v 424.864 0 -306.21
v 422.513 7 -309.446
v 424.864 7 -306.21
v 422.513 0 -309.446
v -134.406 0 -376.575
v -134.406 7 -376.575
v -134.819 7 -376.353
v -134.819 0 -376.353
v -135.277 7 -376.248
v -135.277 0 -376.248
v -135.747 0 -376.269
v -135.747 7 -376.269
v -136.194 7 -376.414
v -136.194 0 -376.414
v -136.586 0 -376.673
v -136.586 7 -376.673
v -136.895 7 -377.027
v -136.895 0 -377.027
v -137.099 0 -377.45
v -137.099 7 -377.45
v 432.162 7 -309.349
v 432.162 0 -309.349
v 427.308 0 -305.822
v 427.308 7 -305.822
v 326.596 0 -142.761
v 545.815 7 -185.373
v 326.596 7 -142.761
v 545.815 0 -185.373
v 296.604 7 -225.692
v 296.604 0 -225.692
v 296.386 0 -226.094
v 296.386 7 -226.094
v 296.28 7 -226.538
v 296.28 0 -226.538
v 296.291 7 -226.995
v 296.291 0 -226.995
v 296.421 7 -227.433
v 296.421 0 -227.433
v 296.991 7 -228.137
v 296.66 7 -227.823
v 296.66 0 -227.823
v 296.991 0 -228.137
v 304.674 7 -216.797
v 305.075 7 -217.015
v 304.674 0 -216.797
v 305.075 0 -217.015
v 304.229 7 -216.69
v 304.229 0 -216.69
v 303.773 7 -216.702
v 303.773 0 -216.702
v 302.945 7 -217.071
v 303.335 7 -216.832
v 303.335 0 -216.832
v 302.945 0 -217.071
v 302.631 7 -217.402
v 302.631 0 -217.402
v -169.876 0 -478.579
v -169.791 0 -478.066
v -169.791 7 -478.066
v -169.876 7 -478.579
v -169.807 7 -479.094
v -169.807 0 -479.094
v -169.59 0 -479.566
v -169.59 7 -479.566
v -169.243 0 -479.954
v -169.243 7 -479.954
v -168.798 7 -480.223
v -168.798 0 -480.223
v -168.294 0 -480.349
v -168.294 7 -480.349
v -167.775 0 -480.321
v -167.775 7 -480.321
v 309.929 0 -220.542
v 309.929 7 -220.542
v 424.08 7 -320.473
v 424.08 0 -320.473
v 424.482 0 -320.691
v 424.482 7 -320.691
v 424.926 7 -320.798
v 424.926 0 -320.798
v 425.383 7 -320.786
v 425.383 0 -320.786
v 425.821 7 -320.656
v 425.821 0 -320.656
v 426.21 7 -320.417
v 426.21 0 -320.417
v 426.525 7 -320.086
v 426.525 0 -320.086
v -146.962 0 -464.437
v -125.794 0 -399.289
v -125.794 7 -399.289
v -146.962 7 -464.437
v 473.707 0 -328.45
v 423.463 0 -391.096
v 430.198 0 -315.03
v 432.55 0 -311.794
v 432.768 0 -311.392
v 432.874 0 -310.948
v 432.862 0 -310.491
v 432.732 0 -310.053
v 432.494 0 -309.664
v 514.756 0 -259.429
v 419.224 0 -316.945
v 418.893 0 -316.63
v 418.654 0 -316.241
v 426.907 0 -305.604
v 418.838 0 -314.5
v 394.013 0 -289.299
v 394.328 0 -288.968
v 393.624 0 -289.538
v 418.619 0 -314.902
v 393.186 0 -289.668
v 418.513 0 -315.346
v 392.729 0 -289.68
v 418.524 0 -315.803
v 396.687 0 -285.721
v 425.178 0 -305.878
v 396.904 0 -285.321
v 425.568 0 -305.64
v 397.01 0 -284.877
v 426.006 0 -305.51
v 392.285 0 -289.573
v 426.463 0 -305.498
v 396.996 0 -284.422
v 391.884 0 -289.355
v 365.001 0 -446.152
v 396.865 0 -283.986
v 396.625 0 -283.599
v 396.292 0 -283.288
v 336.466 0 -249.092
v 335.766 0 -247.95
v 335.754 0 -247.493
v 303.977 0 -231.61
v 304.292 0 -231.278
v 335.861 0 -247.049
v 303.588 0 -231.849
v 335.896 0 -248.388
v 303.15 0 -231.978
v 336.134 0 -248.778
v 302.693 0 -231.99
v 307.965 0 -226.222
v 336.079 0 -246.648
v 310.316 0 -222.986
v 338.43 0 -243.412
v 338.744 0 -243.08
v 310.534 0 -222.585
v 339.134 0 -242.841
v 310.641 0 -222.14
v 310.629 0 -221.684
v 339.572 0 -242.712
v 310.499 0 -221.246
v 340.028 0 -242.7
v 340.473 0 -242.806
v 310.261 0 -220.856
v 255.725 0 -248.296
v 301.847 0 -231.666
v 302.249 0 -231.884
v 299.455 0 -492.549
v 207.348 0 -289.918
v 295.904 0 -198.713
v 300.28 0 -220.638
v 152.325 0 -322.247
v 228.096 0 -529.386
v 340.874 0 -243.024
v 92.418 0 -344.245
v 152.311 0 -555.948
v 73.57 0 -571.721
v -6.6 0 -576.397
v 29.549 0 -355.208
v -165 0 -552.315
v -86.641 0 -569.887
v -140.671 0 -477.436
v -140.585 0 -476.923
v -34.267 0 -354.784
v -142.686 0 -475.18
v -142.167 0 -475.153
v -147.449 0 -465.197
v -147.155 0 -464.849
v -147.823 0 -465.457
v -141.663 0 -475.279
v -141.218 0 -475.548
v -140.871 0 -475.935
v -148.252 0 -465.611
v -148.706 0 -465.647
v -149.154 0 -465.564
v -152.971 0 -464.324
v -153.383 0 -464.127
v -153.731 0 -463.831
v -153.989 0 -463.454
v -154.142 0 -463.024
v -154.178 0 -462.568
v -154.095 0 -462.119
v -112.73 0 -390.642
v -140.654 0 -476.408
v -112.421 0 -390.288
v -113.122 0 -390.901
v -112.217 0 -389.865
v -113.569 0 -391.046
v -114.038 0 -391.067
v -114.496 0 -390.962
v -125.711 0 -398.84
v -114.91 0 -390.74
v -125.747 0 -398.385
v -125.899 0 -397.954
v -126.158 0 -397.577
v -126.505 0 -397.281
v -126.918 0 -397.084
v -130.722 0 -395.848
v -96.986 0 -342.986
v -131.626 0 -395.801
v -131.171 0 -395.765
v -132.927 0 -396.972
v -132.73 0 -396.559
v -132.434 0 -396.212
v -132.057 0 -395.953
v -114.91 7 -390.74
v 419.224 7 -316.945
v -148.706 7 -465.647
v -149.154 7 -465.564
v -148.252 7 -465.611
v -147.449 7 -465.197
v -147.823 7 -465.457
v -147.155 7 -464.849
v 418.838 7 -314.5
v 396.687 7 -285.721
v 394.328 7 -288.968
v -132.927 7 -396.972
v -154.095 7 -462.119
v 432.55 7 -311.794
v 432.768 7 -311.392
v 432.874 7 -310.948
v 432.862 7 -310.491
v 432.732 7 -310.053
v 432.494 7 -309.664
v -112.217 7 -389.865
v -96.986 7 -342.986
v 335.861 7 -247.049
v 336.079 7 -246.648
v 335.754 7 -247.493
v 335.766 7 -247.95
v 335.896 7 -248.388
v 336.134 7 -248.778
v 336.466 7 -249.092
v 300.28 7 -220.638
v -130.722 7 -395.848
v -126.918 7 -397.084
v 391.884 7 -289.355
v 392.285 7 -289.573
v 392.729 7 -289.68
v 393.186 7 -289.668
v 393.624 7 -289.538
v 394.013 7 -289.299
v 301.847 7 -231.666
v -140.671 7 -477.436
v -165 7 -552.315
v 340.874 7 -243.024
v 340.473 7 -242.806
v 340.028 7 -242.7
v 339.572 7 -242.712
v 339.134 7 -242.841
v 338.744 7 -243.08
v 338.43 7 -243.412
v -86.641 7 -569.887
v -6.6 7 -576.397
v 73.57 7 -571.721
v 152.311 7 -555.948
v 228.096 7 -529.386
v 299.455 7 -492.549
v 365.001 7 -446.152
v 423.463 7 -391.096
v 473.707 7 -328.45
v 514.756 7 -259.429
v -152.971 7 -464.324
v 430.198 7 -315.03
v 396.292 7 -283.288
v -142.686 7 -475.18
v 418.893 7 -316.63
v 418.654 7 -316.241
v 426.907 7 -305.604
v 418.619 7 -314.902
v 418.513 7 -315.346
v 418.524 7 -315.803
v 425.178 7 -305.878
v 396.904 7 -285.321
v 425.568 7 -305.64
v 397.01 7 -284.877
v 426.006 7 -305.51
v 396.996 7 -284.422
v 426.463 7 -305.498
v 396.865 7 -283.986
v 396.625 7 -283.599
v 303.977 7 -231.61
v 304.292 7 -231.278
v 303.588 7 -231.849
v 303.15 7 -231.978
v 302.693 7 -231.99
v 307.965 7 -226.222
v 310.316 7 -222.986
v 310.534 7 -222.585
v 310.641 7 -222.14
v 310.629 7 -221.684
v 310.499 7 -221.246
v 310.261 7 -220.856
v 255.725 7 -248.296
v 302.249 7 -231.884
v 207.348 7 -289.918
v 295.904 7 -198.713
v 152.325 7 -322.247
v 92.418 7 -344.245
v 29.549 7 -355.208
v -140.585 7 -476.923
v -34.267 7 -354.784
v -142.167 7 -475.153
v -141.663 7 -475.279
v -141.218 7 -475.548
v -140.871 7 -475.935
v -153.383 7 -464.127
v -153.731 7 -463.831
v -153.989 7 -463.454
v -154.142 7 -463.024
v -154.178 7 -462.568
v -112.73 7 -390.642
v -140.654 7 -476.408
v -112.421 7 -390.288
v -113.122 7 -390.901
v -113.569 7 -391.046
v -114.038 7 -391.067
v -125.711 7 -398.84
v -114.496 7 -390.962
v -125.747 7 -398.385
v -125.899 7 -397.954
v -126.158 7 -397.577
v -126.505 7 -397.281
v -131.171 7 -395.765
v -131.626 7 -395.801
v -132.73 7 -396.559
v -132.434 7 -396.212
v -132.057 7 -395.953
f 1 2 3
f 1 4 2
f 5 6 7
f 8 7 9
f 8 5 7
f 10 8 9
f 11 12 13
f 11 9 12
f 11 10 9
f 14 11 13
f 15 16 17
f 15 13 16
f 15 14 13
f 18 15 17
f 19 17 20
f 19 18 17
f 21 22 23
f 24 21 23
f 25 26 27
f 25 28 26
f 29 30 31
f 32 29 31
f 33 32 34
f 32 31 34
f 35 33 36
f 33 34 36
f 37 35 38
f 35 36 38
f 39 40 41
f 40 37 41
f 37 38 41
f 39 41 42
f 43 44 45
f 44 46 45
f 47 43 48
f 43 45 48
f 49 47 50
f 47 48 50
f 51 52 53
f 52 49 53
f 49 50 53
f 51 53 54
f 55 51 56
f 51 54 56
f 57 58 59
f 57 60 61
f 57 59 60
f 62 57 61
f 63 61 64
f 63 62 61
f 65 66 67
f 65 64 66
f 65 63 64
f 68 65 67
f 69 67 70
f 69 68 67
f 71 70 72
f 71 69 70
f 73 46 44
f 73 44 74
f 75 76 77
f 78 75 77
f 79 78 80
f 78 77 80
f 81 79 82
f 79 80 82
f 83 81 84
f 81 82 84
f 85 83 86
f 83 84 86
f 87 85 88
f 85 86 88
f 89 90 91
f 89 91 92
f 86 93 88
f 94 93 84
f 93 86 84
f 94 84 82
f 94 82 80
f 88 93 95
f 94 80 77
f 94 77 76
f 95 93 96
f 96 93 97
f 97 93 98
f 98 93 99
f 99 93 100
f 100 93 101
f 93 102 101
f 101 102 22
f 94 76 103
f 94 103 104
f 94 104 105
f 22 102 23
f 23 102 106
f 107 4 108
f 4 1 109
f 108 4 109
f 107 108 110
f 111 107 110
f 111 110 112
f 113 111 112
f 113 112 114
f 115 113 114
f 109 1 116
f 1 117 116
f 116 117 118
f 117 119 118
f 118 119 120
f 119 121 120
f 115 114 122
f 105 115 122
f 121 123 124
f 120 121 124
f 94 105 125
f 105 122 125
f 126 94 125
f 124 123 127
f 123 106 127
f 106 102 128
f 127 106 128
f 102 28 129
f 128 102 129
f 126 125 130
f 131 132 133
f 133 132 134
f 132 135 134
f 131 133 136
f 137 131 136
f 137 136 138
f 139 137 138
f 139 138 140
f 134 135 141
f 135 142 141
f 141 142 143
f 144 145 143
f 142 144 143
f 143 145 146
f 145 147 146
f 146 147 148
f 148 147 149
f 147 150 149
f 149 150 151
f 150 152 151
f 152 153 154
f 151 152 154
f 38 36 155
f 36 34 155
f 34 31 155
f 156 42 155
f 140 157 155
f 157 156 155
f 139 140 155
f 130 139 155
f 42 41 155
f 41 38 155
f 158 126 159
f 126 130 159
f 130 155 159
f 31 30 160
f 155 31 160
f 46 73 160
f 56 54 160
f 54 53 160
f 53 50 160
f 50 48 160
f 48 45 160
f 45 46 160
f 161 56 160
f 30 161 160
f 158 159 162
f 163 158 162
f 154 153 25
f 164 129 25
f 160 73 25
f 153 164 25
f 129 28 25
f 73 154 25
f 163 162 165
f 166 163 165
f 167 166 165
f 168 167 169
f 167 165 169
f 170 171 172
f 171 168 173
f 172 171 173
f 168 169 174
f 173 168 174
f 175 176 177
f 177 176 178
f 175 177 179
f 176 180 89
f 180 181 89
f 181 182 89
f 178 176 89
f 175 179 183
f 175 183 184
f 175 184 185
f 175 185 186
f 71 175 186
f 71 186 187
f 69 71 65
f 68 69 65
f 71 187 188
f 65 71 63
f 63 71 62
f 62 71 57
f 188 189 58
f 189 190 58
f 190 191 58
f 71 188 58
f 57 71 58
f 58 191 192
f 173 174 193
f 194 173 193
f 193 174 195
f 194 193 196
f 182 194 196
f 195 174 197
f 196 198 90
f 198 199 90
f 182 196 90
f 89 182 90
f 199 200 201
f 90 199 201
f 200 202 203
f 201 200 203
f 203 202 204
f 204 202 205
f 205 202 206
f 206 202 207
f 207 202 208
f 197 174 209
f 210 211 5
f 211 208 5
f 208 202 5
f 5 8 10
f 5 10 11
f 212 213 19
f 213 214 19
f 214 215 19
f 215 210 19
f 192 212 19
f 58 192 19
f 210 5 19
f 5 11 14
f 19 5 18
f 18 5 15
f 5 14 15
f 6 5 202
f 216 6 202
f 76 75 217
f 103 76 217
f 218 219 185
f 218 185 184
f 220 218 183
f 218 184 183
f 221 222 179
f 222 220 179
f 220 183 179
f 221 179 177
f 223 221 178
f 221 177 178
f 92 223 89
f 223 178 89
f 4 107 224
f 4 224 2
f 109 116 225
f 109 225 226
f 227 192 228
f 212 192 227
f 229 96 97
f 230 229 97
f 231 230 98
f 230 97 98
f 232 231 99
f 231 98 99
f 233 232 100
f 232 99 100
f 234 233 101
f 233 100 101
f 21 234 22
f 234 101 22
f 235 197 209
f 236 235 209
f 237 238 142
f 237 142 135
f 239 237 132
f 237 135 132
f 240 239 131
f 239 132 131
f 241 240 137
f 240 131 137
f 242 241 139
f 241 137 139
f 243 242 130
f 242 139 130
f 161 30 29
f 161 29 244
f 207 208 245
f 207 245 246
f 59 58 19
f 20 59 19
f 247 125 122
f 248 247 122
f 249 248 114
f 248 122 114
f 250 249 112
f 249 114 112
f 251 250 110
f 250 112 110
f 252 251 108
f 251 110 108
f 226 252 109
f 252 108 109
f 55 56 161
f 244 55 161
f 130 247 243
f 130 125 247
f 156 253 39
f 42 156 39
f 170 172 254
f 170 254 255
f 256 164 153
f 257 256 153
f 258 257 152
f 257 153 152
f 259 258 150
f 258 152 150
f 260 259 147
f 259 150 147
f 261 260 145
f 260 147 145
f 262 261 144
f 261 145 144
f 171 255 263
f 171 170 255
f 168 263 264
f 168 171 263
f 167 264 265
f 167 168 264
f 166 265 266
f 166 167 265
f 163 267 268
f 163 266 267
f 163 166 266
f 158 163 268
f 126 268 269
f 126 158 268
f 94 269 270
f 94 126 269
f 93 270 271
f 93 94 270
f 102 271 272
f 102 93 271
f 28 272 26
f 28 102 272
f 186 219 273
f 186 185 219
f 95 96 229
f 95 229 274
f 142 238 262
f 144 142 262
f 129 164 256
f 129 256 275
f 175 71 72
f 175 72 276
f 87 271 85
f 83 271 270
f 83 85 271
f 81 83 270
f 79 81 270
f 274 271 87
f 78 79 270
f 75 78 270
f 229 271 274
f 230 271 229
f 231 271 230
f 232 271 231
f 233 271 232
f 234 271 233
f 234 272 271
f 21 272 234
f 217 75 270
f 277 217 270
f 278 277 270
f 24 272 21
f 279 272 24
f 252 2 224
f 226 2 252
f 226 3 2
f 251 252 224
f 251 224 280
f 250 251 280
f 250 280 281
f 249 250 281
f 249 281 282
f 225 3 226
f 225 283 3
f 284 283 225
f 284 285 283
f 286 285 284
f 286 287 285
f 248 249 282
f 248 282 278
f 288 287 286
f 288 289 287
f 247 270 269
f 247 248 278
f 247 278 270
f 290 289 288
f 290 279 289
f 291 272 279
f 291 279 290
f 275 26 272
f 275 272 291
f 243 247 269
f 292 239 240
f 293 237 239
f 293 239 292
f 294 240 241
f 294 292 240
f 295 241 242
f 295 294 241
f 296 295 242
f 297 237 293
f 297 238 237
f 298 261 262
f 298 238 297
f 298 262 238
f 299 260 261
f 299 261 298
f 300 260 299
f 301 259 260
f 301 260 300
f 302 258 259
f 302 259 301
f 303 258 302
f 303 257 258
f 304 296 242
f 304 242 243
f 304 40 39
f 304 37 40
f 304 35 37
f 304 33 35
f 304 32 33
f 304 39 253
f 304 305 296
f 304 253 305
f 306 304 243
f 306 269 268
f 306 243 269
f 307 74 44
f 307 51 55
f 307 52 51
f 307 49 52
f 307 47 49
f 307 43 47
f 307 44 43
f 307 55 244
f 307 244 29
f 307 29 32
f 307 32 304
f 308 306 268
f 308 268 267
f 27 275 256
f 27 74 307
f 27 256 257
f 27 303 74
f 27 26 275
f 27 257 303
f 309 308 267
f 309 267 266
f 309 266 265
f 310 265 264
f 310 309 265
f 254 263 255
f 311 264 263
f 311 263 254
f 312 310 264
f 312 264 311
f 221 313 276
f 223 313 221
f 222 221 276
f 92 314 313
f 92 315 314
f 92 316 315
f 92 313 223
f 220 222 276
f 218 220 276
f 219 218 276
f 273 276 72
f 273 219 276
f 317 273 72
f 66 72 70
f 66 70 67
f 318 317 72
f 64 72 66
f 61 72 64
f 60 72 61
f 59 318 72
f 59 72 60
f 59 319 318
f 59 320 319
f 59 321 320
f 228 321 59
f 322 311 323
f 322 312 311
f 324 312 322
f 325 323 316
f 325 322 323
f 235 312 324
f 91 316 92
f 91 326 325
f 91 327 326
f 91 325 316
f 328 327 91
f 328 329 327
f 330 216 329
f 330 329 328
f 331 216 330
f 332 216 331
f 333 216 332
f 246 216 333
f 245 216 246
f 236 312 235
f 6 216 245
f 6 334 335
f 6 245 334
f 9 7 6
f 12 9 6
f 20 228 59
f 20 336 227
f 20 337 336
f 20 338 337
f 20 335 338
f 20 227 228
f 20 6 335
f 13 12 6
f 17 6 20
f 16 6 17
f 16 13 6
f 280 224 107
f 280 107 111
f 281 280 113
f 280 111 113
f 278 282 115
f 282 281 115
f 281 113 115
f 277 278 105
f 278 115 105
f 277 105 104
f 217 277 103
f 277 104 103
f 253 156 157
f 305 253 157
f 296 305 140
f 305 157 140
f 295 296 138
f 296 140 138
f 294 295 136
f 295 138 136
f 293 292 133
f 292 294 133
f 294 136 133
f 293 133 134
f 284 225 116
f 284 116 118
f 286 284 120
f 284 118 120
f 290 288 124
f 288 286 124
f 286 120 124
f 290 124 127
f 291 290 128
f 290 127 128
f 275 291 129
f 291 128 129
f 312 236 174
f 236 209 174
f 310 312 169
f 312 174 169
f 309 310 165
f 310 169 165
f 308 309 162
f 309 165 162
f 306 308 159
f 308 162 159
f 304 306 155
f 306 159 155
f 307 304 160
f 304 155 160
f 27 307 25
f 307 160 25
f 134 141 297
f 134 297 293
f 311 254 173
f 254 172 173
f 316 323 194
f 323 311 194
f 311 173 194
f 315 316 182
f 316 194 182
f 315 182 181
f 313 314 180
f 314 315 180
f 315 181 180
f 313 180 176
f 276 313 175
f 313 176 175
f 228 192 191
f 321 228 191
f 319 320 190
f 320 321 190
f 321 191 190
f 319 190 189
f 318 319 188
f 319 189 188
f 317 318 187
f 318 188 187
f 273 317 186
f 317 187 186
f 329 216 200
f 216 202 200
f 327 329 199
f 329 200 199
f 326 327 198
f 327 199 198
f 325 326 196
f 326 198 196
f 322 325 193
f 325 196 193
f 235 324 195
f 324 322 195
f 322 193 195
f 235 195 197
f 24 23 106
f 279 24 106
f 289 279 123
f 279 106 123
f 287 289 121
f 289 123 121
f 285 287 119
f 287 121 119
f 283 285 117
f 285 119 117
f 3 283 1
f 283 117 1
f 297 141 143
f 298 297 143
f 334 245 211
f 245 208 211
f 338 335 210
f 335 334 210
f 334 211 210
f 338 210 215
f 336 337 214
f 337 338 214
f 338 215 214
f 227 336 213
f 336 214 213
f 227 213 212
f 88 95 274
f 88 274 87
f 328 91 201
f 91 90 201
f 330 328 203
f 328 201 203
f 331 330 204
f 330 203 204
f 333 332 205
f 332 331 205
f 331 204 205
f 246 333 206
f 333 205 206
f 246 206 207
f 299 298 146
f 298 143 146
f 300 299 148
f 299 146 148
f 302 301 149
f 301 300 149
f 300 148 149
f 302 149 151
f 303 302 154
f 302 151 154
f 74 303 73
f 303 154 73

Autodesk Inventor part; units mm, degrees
ref_plane "YZ Plane" through (0, 0, 0) normal (1, 0, 0) x (0, 1, 0)
ref_plane "XZ Plane" through (0, 0, 0) normal (0, 1, 0) x (-1, 0, 0)
ref_plane "XY Plane" through (0, 0, 0) normal (0, 0, 1) x (1, 0, 0)
sketch "Sketch1" plane through (0, 0, 0) normal (0, 1, 0) x (-1, 0, 0)
  line L0 (-545.8153, 185.3726) -> (-326.5965, 142.7608)
  line L1 (-545.8153, -185.3726) -> (-326.5965, -142.7608)
  arc A0 (-545.8153, -185.3726) -> (-545.8153, 185.3726) centre (0, 0) ccw
  arc A1 (374.3691, 3.75) -> (372.6191, 2) centre (374.3691, 2) ccw
  arc A2 (372.6191, -2) -> (374.3691, -3.75) centre (374.3691, -2) ccw
  line L2 (380.3691, 3.75) -> (374.3691, 3.75)
  line L3 (374.3691, -3.75) -> (380.3691, -3.75)
  line L4 (382.1191, 2) -> (382.1191, -2)
  arc A3 (380.3691, -3.75) -> (382.1191, -2) centre (380.3691, -2) ccw
  arc A4 (382.1191, 2) -> (380.3691, 3.75) centre (380.3691, 2) ccw
  line L5 (372.6191, -2) -> (372.6191, 2)
  line L6 (523.7076, 2) -> (523.7076, -2)
  arc A5 (523.7076, -2) -> (525.4576, -3.75) centre (525.4576, -2) ccw
  arc A6 (525.4576, 3.75) -> (523.7076, 2) centre (525.4576, 2) ccw
  line L7 (531.4576, -3.75) -> (525.4576, -3.75)
  line L8 (525.4576, 3.75) -> (531.4576, 3.75)
  arc A7 (531.4576, -3.75) -> (533.2076, -2) centre (531.4576, -2) ccw
  line L9 (533.2076, -2) -> (533.2076, 2)
  arc A8 (533.2076, 2) -> (531.4576, 3.75) centre (531.4576, 2) ccw
  arc A9 (-326.5965, -142.7608) -> (-326.5965, 142.7608) centre (0, 0) ccw
  line L10 (116.1792, 364.0349) -> (119.9834, 362.7989)
  arc A10 (121.107, 360.5937) -> (119.9834, 362.7989) centre (119.4426, 361.1345) ccw
  arc A11 (116.1792, 364.0349) -> (113.9741, 362.9114) centre (115.6384, 362.3706) ccw
  line L11 (119.2529, 354.8874) -> (121.107, 360.5937)
  line L12 (113.9741, 362.9114) -> (112.12, 357.205)
  line L13 (117.0478, 353.7638) -> (113.2435, 354.9999)
  arc A12 (112.12, 357.205) -> (113.2435, 354.9999) centre (113.7843, 356.6642) ccw
  arc A13 (117.0478, 353.7638) -> (119.2529, 354.8874) centre (117.5885, 355.4282) ccw
  arc A14 (163.7367, 497.4575) -> (165.9418, 498.5811) centre (164.2774, 499.1218) ccw
  arc A15 (158.8089, 500.8987) -> (159.9324, 498.6936) centre (160.4732, 500.3579) ccw
  line L14 (159.9324, 498.6936) -> (163.7367, 497.4575)
  line L15 (158.8089, 500.8987) -> (160.663, 506.605)
  line L16 (167.7959, 504.2874) -> (165.9418, 498.5811)
  arc A16 (162.8681, 507.7286) -> (160.663, 506.605) centre (162.3273, 506.0642) ccw
  line L17 (166.6723, 506.4925) -> (162.8681, 507.7286)
  arc A17 (167.7959, 504.2874) -> (166.6723, 506.4925) centre (166.1315, 504.8282) ccw
  line L18 (-310.3164, 222.986) -> (-307.9653, 226.222)
  arc A18 (-305.5209, 226.6092) -> (-307.9653, 226.222) centre (-306.5495, 225.1934) ccw
  arc A19 (-310.3164, 222.986) -> (-309.9293, 220.5416) centre (-308.9007, 221.9573) ccw
  line L19 (-300.6668, 223.0825) -> (-305.5209, 226.6092)
  line L20 (-309.9293, 220.5416) -> (-305.0752, 217.0148)
  line L21 (-300.2796, 220.6381) -> (-302.6308, 217.402)
  arc A20 (-305.0752, 217.0148) -> (-302.6308, 217.402) centre (-304.0466, 218.4306) ccw
  arc A21 (-300.2796, 220.6381) -> (-300.6668, 223.0825) centre (-301.6954, 221.6667) ccw
  arc A22 (-422.5128, 309.4456) -> (-422.8999, 311.89) centre (-423.9286, 310.4743) ccw
  arc A23 (-427.3083, 305.8224) -> (-424.8639, 306.2096) centre (-426.2797, 307.2382) ccw
  line L22 (-424.8639, 306.2096) -> (-422.5128, 309.4456)
  line L23 (-427.3083, 305.8224) -> (-432.1624, 309.3491)
  line L24 (-427.754, 315.4167) -> (-422.8999, 311.89)
  arc A24 (-432.5496, 311.7935) -> (-432.1624, 309.3491) centre (-431.1338, 310.7649) ccw
  line L25 (-430.1984, 315.0296) -> (-432.5496, 311.7935)
  arc A25 (-427.754, 315.4167) -> (-430.1984, 315.0296) centre (-428.7827, 314.001) ccw
  line L26 (-307.9653, -226.222) -> (-310.3164, -222.986)
  arc A26 (-309.9293, -220.5416) -> (-310.3164, -222.986) centre (-308.9007, -221.9573) ccw
  arc A27 (-307.9653, -226.222) -> (-305.5209, -226.6092) centre (-306.5495, -225.1934) ccw
  line L27 (-305.0752, -217.0148) -> (-309.9293, -220.5416)
  line L28 (-305.5209, -226.6092) -> (-300.6668, -223.0825)
  line L29 (-302.6308, -217.402) -> (-300.2796, -220.6381)
  arc A28 (-300.6668, -223.0825) -> (-300.2796, -220.6381) centre (-301.6954, -221.6667) ccw
  arc A29 (-302.6308, -217.402) -> (-305.0752, -217.0148) centre (-304.0466, -218.4306) ccw
  arc A30 (-424.8639, -306.2096) -> (-427.3083, -305.8224) centre (-426.2797, -307.2382) ccw
  arc A31 (-422.8999, -311.89) -> (-422.5128, -309.4456) centre (-423.9286, -310.4743) ccw
  line L30 (-422.5128, -309.4456) -> (-424.8639, -306.2096)
  line L31 (-422.8999, -311.89) -> (-427.754, -315.4167)
  line L32 (-432.1624, -309.3491) -> (-427.3083, -305.8224)
  arc A32 (-430.1984, -315.0296) -> (-427.754, -315.4167) centre (-428.7827, -314.001) ccw
  line L33 (-432.5496, -311.7935) -> (-430.1984, -315.0296)
  arc A33 (-432.1624, -309.3491) -> (-432.5496, -311.7935) centre (-431.1338, -310.7649) ccw
  line L34 (119.9834, -362.7989) -> (116.1792, -364.0349)
  arc A34 (113.9741, -362.9114) -> (116.1792, -364.0349) centre (115.6384, -362.3706) ccw
  arc A35 (119.9834, -362.7989) -> (121.107, -360.5937) centre (119.4426, -361.1345) ccw
  line L35 (112.12, -357.205) -> (113.9741, -362.9114)
  line L36 (121.107, -360.5937) -> (119.2529, -354.8874)
  line L37 (113.2435, -354.9999) -> (117.0478, -353.7638)
  arc A36 (119.2529, -354.8874) -> (117.0478, -353.7638) centre (117.5885, -355.4282) ccw
  arc A37 (113.2435, -354.9999) -> (112.12, -357.205) centre (113.7843, -356.6642) ccw
  arc A38 (159.9324, -498.6936) -> (158.8089, -500.8987) centre (160.4732, -500.3579) ccw
  arc A39 (165.9418, -498.5811) -> (163.7367, -497.4575) centre (164.2774, -499.1218) ccw
  line L38 (163.7367, -497.4575) -> (159.9324, -498.6936)
  line L39 (165.9418, -498.5811) -> (167.7959, -504.2874)
  line L40 (160.663, -506.605) -> (158.8089, -500.8987)
  arc A40 (166.6723, -506.4925) -> (167.7959, -504.2874) centre (166.1315, -504.8282) ccw
  line L41 (162.8681, -507.7286) -> (166.6723, -506.4925)
  arc A41 (160.663, -506.605) -> (162.8681, -507.7286) centre (162.3273, -506.0642) ccw
  line L42 (225.4462, 74.1184) -> (211.8442, 74.1184)
  line L43 (225.4462, 74.1184) -> (225.4462, 49.1184)
  arc A42 (405.4604, -13.75) -> (407.1248, -11.4592) centre (405.4604, -12) ccw
  arc A43 (496.0158, -11.1361) -> (497.5378, -13.75) centre (497.5378, -12) ccw
  line L44 (508.6578, 11.1361) -> (496.0158, -11.1361)
  arc A44 (508.6578, 11.1361) -> (507.1359, 13.75) centre (507.1359, 12) ccw
  arc A45 (416.8691, -2) -> (418.6191, -3.75) centre (418.6191, -2) ccw
  line L45 (399.6781, 11.4592) -> (407.1248, -11.4592)
  line L46 (416.8691, 2) -> (416.8691, -2)
  arc A46 (401.3425, 13.75) -> (399.6781, 11.4592) centre (401.3425, 12) ccw
  arc A47 (418.6191, 3.75) -> (416.8691, 2) centre (418.6191, 2) ccw
  line L47 (507.1359, 13.75) -> (401.3425, 13.75)
  line L48 (418.6191, -3.75) -> (487.1191, -3.75)
  line L49 (487.1191, 3.75) -> (418.6191, 3.75)
  arc A48 (487.1191, -3.75) -> (488.8691, -2.0136) centre (487.1326, -2.0136) ccw
  line L50 (488.8691, -2.0136) -> (488.8691, 2)
  arc A49 (488.8691, 2) -> (487.1191, 3.75) centre (487.1191, 2) ccw
  line L51 (405.4604, -13.75) -> (356.1697, -13.75)
  line L52 (497.5378, -13.75) -> (576.271, -13.75)
  arc A50 (163.8684, 468.2978) -> (166.8247, 468.9375) centre (165.1603, 469.4783) ccw
  line L53 (146.5928, 487.2036) -> (163.8684, 468.2978)
  arc A51 (146.5928, 487.2036) -> (143.6366, 486.5639) centre (145.3009, 486.0231) ccw
  line L54 (152.9839, 464.32) -> (149.1668, 465.5602)
  arc A52 (154.0946, 462.119) -> (152.9839, 464.32) centre (152.4473, 462.6685) ccw
  arc A53 (149.1668, 465.5602) -> (146.9616, 464.4366) centre (148.626, 463.8959) ccw
  arc A54 (110.9446, 385.9484) -> (112.609, 383.6576) centre (112.609, 385.4076) ccw
  arc A55 (138.3712, 381.3668) -> (136.7068, 383.6576) centre (136.7068, 381.9076) ccw
  line L55 (112.609, 383.6576) -> (136.7068, 383.6576)
  line L56 (126.9175, 397.0841) -> (130.7218, 395.8481)
  arc A56 (125.794, 399.2893) -> (126.9175, 397.0841) centre (127.4583, 398.7485) ccw
  line L57 (143.6366, 486.5639) -> (110.9446, 385.9484)
  line L58 (146.9616, 464.4366) -> (125.794, 399.2893)
  line L59 (132.9269, 396.9716) -> (154.0946, 462.119)
  arc A57 (130.7218, 395.8481) -> (132.9269, 396.9716) centre (131.2625, 397.5124) ccw
  line L60 (138.3712, 381.3668) -> (123.1395, 334.4885)
  line L61 (166.8247, 468.9375) -> (191.1546, 543.8173)
  line L62 (-394.3199, 288.9791) -> (-396.679, 285.732)
  arc A58 (-391.8835, 289.3553) -> (-394.3199, 288.9791) centre (-392.915, 287.9584) ccw
  arc A59 (-396.679, 285.732) -> (-396.2919, 283.2876) centre (-395.2632, 284.7034) ccw
  line L63 (-338.4298, 243.4115) -> (-336.0786, 246.6476)
  arc A60 (-340.8742, 243.0243) -> (-338.4298, 243.4115) centre (-339.8456, 244.4401) ccw
  line L64 (-396.2919, 283.2876) -> (-340.8742, 243.0243)
  line L65 (-336.4658, 249.092) -> (-391.8835, 289.3553)
  arc A61 (-336.0786, 246.6476) -> (-336.4658, 249.092) centre (-337.4944, 247.6762) ccw
  line L66 (-396.687, -285.7211) -> (-394.3279, -288.9681)
  arc A62 (-396.2919, -283.2876) -> (-396.687, -285.7211) centre (-395.2821, -284.7004) ccw
  arc A63 (-394.3279, -288.9681) -> (-391.8835, -289.3553) centre (-392.9121, -287.9395) ccw
  line L67 (-336.0786, -246.6476) -> (-338.4298, -243.4115)
  arc A64 (-336.4658, -249.092) -> (-336.0786, -246.6476) centre (-337.4944, -247.6762) ccw
  line L68 (-391.8835, -289.3553) -> (-336.4658, -249.092)
  line L69 (-340.8742, -243.0243) -> (-396.2919, -283.2876)
  arc A65 (-338.4298, -243.4115) -> (-340.8742, -243.0243) centre (-339.8456, -244.4401) ccw
  arc A66 (142.6862, -475.1804) -> (140.6706, -477.4355) centre (142.3349, -476.8947) ccw
  line L70 (167.775, -480.3211) -> (142.6862, -475.1804)
  arc A67 (167.775, -480.3211) -> (169.7906, -478.0659) centre (168.1263, -478.6067) ccw
  line L71 (149.1539, -465.5644) -> (152.971, -464.3241)
  arc A68 (146.9616, -464.4366) -> (149.1539, -465.5644) centre (148.6173, -463.9129) ccw
  arc A69 (152.971, -464.3241) -> (154.0946, -462.119) centre (152.4302, -462.6598) ccw
  arc A70 (137.0987, -377.4504) -> (134.4057, -376.5754) centre (135.4343, -377.9912) ccw
  arc A71 (112.2171, -389.8648) -> (114.9101, -390.7398) centre (113.8815, -389.324) ccw
  line L72 (134.4057, -376.5754) -> (114.9101, -390.7398)
  line L73 (130.7218, -395.8481) -> (126.9175, -397.0841)
  arc A72 (132.9269, -396.9716) -> (130.7218, -395.8481) centre (131.2625, -397.5124) ccw
  line L74 (169.7906, -478.0659) -> (137.0987, -377.4504)
  line L75 (154.0946, -462.119) -> (132.9269, -396.9716)
  line L76 (125.794, -399.2893) -> (146.9616, -464.4366)
  arc A73 (126.9175, -397.0841) -> (125.794, -399.2893) centre (127.4583, -398.7485) ccw
  line L77 (112.2171, -389.8648) -> (96.9855, -342.9865)
  line L78 (140.6706, -477.4355) -> (165.0005, -552.3153)
  line L79 (-432.5496, 311.7935) -> (-436.2232, 306.7372)
  line L80 (-435.8361, 304.2928) -> (-430.9801, 300.7647)
  line L81 (-428.5353, 301.1524) -> (-424.8639, 306.2096)
  arc A74 (-436.2232, 306.7372) -> (-435.8361, 304.2928) centre (-434.8075, 305.7085) ccw
  arc A75 (-430.9801, 300.7647) -> (-428.5353, 301.1524) centre (-429.9515, 302.1805) ccw
  line L82 (-310.3164, 222.986) -> (-313.9901, 217.9296)
  line L83 (-313.603, 215.4852) -> (-308.7469, 211.9571)
  line L84 (-306.3022, 212.3448) -> (-302.6308, 217.402)
  arc A76 (-313.9901, 217.9296) -> (-313.603, 215.4852) centre (-312.5743, 216.901) ccw
  arc A77 (-308.7469, 211.9571) -> (-306.3022, 212.3448) centre (-307.7183, 213.3729) ccw
  line L85 (-430.1984, -315.0296) -> (-426.5248, -320.086)
  arc A78 (-426.5248, -320.086) -> (-424.0804, -320.4731) centre (-425.109, -319.0573) ccw
  line L86 (-424.0804, -320.4731) -> (-419.2244, -316.945)
  arc A79 (-419.2244, -316.945) -> (-418.8376, -314.5001) centre (-420.253, -315.5292) ccw
  line L87 (-418.8376, -314.5001) -> (-422.5128, -309.4456)
  line L88 (-307.9653, -226.222) -> (-304.2917, -231.2784)
  arc A80 (-304.2917, -231.2784) -> (-301.8472, -231.6655) centre (-302.8759, -230.2498) ccw
  line L89 (-301.8472, -231.6655) -> (-296.9912, -228.1374)
  line L90 (-296.6045, -225.6925) -> (-300.2796, -220.6381)
  arc A81 (-296.9912, -228.1374) -> (-296.6045, -225.6925) centre (-298.0199, -226.7217) ccw
  line L91 (166.6723, -506.4925) -> (172.6164, -504.5612)
  arc A82 (172.6164, -504.5612) -> (173.74, -502.356) centre (172.0756, -502.8968) ccw
  line L92 (173.74, -502.356) -> (171.8852, -496.6475)
  arc A83 (171.8852, -496.6475) -> (169.6794, -495.5241) centre (170.2208, -497.1882) ccw
  line L93 (169.6794, -495.5241) -> (163.7367, -497.4575)
  line L94 (119.9834, -362.7989) -> (125.9275, -360.8675)
  arc A84 (125.9275, -360.8675) -> (127.0511, -358.6624) centre (125.3867, -359.2032) ccw
  line L95 (127.0511, -358.6624) -> (125.1963, -352.9538)
  line L96 (122.9905, -351.8304) -> (117.0478, -353.7638)
  arc A85 (125.1963, -352.9538) -> (122.9905, -351.8304) centre (123.5319, -353.4946) ccw
  line L97 (533.2076, 2) -> (533.2076, 8.25)
  arc A86 (533.2076, 8.25) -> (531.4576, 10) centre (531.4576, 8.25) ccw
  line L98 (531.4576, 10) -> (525.4552, 10)
  arc A87 (525.4552, 10) -> (523.7052, 8.2493) centre (525.4552, 8.25) ccw
  line L99 (523.7052, 8.2493) -> (523.7076, 2)
  line L100 (382.1191, 2) -> (382.1191, 8.25)
  arc A88 (382.1191, 8.25) -> (380.3691, 10) centre (380.3691, 8.25) ccw
  line L101 (380.3691, 10) -> (374.3668, 10)
  line L102 (372.6168, 8.2493) -> (372.6191, 2)
  arc A89 (374.3668, 10) -> (372.6168, 8.2493) centre (374.3668, 8.25) ccw
  line L103 (162.8681, 507.7286) -> (156.924, 509.6599)
  arc A90 (156.924, 509.6599) -> (154.7189, 508.5364) centre (156.3832, 507.9956) ccw
  line L104 (154.7189, 508.5364) -> (152.864, 502.8278)
  arc A91 (152.864, 502.8278) -> (153.9882, 500.6225) centre (154.5284, 502.287) ccw
  line L105 (153.9882, 500.6225) -> (159.9324, 498.6936)
  line L106 (116.1792, 364.0349) -> (110.2351, 365.9663)
  arc A92 (110.2351, 365.9663) -> (108.03, 364.8427) centre (109.6943, 364.3019) ccw
  line L107 (108.03, 364.8427) -> (106.1751, 359.1341)
  line L108 (107.2993, 356.9288) -> (113.2435, 354.9999)
  arc A93 (106.1751, 359.1341) -> (107.2993, 356.9288) centre (107.8395, 358.5934) ccw
  point P0 (494.5322, -13.75)
  point P1 (417.3817, -3.2374)
  point P2 (417.3817, 3.2374)
  point P3 (488.3566, 3.2374)
  point P4 (165.8959, 466.0791)
  point P5 (147.8315, 465.4551)
  point P6 (125.8991, 397.954)
  point P7 (132.057, 395.9532)
  point P8 (-396.9917, 284.4297)
  point P9 (-339.5718, 242.7117)
  point P10 (-335.766, 247.95)
  point P11 (-393.1859, -289.6679)
  point P12 (-335.766, -247.95)
  point P13 (-339.5718, -242.7117)
  point P14 (139.7418, -474.577)
  point P15 (153.9895, -463.4543)
  point P16 (132.057, -395.9532)
  point P17 (125.8991, -397.954)
  point P18 (-302.6308, 217.402)
  point P19 (113.2435, 354.9999)
  point P20 (372.6191, 2)
  point P21 (117.0478, -353.7638)
  point P22 (-300.2796, -220.6381)
  dimension "d34" = 1152.87
  dimension "d45" = 7.5
  dimension "d48" = 712.87
  dimension "d60" = 360
  dimension "d62" = 13.602
  dimension "d63" = 25
  dimension "d72" = 7.5
  dimension "d74" = 3.5
  dimension "d75" = 3.5
  dimension "d79" = 0
  dimension "d80" = 8
  dimension "d81" = 1.75
  dimension "d84" = 8
  dimension "d85" = 1.75
  dimension "d88" = 360
extrude "Extrusion1" add sketch "Sketch1" along normal blind 7 contours A0 L1 A9 L77 A71 L72 A70 L74 A67 L70 A66 L78
properties part number "Level 2d - V2"
